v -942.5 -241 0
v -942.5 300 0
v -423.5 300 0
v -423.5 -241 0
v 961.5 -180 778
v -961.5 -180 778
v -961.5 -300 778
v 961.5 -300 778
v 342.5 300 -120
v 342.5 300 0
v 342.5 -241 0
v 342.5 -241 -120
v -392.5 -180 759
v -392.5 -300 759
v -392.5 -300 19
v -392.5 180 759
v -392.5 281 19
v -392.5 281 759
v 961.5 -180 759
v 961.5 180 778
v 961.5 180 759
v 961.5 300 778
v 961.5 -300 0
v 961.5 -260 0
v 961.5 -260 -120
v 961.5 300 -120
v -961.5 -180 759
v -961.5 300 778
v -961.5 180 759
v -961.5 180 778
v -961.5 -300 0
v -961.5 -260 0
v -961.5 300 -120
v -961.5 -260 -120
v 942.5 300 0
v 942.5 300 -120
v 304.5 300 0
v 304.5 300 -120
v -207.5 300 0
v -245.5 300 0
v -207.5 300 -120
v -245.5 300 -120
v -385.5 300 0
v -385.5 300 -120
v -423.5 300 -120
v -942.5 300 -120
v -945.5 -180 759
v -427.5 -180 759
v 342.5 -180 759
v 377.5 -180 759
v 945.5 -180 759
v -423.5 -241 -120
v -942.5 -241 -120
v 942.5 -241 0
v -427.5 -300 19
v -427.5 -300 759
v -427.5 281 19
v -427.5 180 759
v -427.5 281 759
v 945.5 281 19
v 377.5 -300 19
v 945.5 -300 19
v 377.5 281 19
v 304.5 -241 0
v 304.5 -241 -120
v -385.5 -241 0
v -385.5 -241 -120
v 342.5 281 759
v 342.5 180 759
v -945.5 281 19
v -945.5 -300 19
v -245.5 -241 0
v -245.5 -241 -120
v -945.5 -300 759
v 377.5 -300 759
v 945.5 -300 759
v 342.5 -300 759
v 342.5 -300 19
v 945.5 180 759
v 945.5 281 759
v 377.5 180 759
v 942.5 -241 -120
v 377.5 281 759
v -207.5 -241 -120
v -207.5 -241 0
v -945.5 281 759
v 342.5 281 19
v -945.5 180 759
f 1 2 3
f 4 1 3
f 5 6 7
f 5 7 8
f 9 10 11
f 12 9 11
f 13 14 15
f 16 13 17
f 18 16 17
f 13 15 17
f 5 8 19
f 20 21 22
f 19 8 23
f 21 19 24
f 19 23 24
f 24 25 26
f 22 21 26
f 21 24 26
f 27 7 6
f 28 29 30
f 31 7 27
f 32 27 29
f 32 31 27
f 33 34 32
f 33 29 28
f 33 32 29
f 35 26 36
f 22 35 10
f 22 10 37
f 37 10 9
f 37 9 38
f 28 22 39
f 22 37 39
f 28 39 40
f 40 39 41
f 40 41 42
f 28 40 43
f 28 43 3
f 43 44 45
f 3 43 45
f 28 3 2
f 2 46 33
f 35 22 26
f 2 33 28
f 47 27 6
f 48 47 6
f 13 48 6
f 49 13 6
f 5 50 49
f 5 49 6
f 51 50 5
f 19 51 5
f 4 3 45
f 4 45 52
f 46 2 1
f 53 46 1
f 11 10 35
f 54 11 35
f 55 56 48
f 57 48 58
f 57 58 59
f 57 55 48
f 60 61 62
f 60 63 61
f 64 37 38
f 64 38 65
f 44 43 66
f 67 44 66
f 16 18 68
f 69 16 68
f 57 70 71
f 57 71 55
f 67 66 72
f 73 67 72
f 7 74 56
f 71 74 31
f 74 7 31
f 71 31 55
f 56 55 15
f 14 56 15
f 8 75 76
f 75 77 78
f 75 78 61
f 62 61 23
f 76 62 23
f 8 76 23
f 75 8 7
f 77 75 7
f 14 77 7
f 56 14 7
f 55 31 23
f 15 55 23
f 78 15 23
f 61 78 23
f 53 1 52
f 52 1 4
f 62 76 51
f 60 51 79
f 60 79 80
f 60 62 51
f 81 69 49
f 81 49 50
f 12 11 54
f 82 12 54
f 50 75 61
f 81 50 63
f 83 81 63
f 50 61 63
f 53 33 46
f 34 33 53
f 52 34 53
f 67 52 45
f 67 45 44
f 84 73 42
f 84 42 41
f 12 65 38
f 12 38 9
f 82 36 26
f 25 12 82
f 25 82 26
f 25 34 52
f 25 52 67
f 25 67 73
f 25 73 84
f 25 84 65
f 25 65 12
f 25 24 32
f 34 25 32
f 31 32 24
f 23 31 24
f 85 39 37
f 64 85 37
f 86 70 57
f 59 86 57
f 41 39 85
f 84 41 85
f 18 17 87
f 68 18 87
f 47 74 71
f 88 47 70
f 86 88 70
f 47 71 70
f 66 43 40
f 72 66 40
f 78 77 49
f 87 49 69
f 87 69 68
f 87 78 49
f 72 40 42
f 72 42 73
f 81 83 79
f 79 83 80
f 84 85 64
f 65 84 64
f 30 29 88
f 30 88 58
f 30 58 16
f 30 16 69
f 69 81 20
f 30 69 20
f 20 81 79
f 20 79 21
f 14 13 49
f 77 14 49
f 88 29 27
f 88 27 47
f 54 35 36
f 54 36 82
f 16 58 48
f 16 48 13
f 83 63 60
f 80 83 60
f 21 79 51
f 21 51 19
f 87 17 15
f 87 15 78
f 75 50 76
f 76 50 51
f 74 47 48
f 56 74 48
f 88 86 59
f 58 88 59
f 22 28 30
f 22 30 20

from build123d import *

# Parameters (mm, degrees)
F0_W     = 1923
F0_H     = 600
F1_DEPTH = 19
F2_W     = 19
F2_H     = 541
F3_DEPTH = 120
F4_W     = 16
F4_H     = 581
F4_W_2   = 19
F5_DEPTH = 740
F6_W     = 1923
F6_H     = 120
F7_DEPTH = 19


with BuildPart() as f1:
    # F0 (on Top) → F1 (new body)
    with BuildSketch(Plane.XY):
        Rectangle(F0_W, F0_H)
    extrude(amount=F1_DEPTH)

    # F2 (on face) → F3 (join)
    with BuildSketch(Plane(origin=(0, 0, 0), x_dir=(1, 0, 0), z_dir=(0, 0, -1))):
        with Locations((-952, -29.5)):
            Rectangle(F2_W, F2_H)
        Polygon((-961.5, 260), (-961.5, 241), (-942.5, 241), (-423.5, 241), (-404.5, 241), (-385.5, 241), (-245.5, 241), (-226.5, 241), (-207.5, 241), (304.5, 241), (323.5, 241), (342.5, 241), (942.5, 241), (961.5, 241), (961.5, 260), align=None)
        with Locations((-414, -29.5)):
            Rectangle(F2_W, F2_H)
        with Locations((-395, -29.5)):
            Rectangle(F2_W, F2_H)
        with Locations((952, -29.5)):
            Rectangle(F2_W, F2_H)
        with Locations((-236, -29.5)):
            Rectangle(F2_W, F2_H)
        with Locations((333, -29.5)):
            Rectangle(F2_W, F2_H)
        with Locations((-217, -29.5)):
            Rectangle(F2_W, F2_H)
        with Locations((314, -29.5)):
            Rectangle(F2_W, F2_H)
    extrude(amount=F3_DEPTH)

    # F4 (on face) → F5 (join)
    with BuildSketch(Plane.XY.offset(19)):
        with Locations((-953.5, -9.5)):
            Rectangle(F4_W, F4_H)
        Polygon((-961.5, 300), (-961.5, 281), (-945.5, 281), (-427.5, 281), (-411.5, 281), (-392.5, 281), (342.5, 281), (361.5, 281), (377.5, 281), (945.5, 281), (961.5, 281), (961.5, 300), align=None)
        with Locations((-419.5, -9.5)):
            Rectangle(F4_W, F4_H)
        with Locations((-402, -9.5)):
            Rectangle(F4_W_2, F4_H)
        with Locations((953.5, -9.5)):
            Rectangle(F4_W, F4_H)
        with Locations((352, -9.5)):
            Rectangle(F4_W_2, F4_H)
        with Locations((369.5, -9.5)):
            Rectangle(F4_W, F4_H)
    extrude(amount=F5_DEPTH)

    # F6 (on face) → F7 (join)
    with BuildSketch(Plane.XY.offset(759)):
        with Locations((0, -240)):
            Rectangle(F6_W, F6_H)
        with Locations((0, 240)):
            Rectangle(F6_W, F6_H)
    extrude(amount=F7_DEPTH)


solid = f1.part
